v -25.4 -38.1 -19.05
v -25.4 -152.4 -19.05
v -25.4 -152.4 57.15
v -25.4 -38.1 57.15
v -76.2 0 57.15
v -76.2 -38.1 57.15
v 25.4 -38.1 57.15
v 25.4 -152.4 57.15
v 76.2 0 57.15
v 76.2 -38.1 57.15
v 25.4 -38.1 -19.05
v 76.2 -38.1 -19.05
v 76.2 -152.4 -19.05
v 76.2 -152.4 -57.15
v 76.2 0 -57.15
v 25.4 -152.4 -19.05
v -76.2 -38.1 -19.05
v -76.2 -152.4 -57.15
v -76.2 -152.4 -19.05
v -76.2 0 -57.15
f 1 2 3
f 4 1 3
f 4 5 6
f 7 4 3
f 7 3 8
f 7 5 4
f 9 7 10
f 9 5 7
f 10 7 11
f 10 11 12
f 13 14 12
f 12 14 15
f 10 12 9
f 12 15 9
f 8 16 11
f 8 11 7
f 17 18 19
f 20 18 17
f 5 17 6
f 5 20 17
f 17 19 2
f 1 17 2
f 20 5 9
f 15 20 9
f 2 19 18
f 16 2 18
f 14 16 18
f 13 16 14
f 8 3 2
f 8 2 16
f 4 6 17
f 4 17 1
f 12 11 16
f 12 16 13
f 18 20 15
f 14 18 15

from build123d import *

# Parameters (mm, degrees)
F0_W     = 152.4
F0_H     = 114.3
F1_DEPTH = 152.4
F2_W     = 50.8
F2_H     = 76.2
F3_DEPTH = 114.3
F4_DEPTH = 114.3


with BuildPart() as f1:
    # F0 (on Front) → F1 (new body)
    with BuildSketch(Plane.XZ):
        Rectangle(F0_W, F0_H)
    extrude(amount=F1_DEPTH)

    # F2 (on face) → F3 (cut)
    with BuildSketch(Plane.XZ.offset(152.4)):
        with Locations((-50.8, 19.05)):
            Rectangle(F2_W, F2_H)
    extrude(amount=-F3_DEPTH, mode=Mode.SUBTRACT)

    # F2 (on face) → F4 (cut)
    with BuildSketch(Plane.XZ.offset(152.4)):
        with Locations((50.8, 19.05)):
            Rectangle(F2_W, F2_H)
    extrude(amount=-F4_DEPTH, mode=Mode.SUBTRACT)


solid = f1.part
